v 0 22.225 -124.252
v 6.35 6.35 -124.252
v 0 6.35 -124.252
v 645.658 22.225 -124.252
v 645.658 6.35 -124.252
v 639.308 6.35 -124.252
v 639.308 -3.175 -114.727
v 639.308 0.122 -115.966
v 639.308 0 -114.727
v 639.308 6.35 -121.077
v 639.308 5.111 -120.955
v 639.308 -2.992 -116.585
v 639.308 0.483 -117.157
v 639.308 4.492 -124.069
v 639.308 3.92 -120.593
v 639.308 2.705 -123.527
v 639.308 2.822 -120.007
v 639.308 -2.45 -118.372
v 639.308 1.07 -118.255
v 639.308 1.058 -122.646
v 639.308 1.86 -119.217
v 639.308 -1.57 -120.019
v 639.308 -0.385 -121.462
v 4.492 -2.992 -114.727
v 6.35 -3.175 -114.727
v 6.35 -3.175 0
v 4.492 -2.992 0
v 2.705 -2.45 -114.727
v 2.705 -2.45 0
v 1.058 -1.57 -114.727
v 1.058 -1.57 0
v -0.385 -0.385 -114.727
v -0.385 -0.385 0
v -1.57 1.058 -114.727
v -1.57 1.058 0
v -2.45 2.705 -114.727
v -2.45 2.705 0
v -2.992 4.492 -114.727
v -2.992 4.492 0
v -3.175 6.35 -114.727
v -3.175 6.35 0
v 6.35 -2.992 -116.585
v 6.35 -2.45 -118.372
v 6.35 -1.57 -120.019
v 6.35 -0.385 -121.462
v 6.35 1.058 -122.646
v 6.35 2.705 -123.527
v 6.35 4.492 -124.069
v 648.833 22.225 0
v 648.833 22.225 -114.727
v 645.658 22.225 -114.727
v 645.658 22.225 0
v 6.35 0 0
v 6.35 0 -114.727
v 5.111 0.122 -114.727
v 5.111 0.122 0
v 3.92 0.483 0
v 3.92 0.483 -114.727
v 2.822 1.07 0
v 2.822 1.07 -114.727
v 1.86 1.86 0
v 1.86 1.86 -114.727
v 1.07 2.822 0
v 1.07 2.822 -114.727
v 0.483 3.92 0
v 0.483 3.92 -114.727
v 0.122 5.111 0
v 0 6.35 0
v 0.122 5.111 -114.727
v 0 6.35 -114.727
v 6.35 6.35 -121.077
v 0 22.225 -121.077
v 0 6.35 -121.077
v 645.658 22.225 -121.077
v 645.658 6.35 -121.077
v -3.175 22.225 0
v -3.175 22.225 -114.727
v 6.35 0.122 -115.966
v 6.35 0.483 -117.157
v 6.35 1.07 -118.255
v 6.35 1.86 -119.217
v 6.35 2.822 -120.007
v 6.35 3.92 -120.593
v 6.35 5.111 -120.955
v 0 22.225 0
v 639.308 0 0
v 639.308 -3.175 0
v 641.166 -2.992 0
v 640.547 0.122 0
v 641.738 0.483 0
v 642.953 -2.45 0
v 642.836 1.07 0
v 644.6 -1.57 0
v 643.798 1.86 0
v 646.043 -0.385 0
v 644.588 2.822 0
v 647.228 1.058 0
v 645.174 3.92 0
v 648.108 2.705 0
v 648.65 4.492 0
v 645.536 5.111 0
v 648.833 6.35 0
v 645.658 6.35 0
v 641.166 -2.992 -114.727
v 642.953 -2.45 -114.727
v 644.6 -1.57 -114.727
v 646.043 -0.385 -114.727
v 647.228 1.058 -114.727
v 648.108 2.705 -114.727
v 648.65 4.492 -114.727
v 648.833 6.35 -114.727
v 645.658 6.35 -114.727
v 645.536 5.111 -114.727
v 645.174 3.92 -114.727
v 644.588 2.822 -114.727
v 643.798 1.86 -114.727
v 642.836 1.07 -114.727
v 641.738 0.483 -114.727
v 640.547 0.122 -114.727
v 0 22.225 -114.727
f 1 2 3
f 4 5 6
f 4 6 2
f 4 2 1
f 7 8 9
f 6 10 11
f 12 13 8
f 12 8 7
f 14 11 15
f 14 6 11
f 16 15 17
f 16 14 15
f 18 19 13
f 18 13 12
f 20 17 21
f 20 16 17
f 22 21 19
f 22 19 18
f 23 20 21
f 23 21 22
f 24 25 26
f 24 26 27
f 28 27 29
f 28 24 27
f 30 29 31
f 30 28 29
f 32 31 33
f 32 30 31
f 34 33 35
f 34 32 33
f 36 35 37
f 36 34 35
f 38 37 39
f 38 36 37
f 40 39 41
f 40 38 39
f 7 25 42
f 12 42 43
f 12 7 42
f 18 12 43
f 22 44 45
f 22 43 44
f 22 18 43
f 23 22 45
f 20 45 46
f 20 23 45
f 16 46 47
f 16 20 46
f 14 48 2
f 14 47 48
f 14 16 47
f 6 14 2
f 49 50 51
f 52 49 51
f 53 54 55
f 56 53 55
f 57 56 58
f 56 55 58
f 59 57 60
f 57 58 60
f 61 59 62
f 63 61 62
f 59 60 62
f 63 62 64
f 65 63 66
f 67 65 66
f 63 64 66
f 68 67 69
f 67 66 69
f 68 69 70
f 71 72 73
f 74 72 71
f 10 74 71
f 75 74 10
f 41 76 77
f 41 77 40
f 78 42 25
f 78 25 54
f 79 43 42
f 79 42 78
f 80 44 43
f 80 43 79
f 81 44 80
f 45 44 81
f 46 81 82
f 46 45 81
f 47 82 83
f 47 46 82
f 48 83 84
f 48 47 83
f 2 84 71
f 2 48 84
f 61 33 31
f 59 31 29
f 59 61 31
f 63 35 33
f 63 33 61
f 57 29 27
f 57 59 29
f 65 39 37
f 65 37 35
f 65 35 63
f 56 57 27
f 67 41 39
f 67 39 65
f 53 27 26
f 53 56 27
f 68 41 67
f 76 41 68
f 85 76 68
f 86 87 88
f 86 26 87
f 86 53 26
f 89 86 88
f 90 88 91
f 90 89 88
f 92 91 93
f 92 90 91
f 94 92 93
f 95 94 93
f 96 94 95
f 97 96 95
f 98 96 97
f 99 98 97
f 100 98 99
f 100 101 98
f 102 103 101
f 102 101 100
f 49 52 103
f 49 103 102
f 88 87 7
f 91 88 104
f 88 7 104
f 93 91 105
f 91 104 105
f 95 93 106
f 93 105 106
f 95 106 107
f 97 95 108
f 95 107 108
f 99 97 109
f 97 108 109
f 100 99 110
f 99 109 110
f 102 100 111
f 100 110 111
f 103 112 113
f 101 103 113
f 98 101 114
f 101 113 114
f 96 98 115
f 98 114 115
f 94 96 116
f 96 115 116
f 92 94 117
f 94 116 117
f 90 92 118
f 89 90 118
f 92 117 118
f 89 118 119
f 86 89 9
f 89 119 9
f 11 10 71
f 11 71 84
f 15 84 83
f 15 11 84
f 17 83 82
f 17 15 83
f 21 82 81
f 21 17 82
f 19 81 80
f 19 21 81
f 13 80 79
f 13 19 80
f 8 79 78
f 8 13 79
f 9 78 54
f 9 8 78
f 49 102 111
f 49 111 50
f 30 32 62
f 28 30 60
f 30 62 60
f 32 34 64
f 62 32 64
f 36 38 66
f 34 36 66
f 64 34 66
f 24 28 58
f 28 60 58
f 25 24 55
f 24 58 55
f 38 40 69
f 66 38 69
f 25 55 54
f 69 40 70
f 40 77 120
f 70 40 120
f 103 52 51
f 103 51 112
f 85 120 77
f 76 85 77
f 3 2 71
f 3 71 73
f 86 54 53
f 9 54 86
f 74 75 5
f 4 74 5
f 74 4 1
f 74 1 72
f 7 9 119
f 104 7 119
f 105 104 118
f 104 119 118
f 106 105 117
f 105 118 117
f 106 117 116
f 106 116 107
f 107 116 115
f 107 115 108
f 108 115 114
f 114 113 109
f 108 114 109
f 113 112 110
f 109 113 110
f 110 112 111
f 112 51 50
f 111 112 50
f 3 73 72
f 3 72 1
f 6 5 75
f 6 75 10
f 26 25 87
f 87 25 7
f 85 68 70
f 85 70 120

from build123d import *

# Parameters (mm, degrees)
SKETCH1_W                    = 645.65784
SKETCH1_H                    = 121.07672
BASE_FLANGE1_DEPTH           = 3.175
EDGE_FLANGE1_STRIP_W         = 25.4
EDGE_FLANGE1_STRIP_H         = 3.175
EDGE_FLANGE1_STRIP_CUT_DEPTH = 645.65784
EDGE_FLANGE1_DEPTH           = 645.65784
EDGE_FLANGE2_START           = -124.25172
EDGE_FLANGE2_DEPTH           = 124.25172
EDGE_FLANGE2_2_DEPTH         = 9.525
EDGE_FLANGE2_START_2         = -114.72672
EDGE_FLANGE2_3_DEPTH         = 114.72672


# Read off the part's stored shape, not the designer's step: Edge-Flange2
# Sheet-metal steps are written as plain solids
with BuildPart() as part:
    # Sketch1 → Base-Flange1 (new body)
    with BuildSketch(Plane(origin=(0, 0, 0), x_dir=(1, 0, 0), z_dir=(0, 1, 0))):
        with Locations((322.82892, 60.53836)):
            Rectangle(SKETCH1_W, SKETCH1_H)
    extrude(amount=-BASE_FLANGE1_DEPTH)

    # Edge-Flange1 strip (across the edge) → Edge-Flange1 strip cut (cut)
    with BuildSketch(Plane(origin=(645.65784, 0, -121.07672), x_dir=(0, 0, 1), z_dir=(-1, 0, 0))):
        with Locations((-6.35, -1.5875)):
            Rectangle(EDGE_FLANGE1_STRIP_W, EDGE_FLANGE1_STRIP_H)
    extrude(amount=EDGE_FLANGE1_STRIP_CUT_DEPTH, mode=Mode.SUBTRACT)

    # Edge-Flange1 section (across the edge) → Edge-Flange1 (add)
    with BuildSketch(Plane(origin=(645.65784, 0, -121.07672), x_dir=(0, 0, 1), z_dir=(-1, 0, 0))):
        with BuildLine():
            Line((-3.175, 6.35), (-3.175, 22.225))
            Line((-3.175, 22.225), (0, 22.225))
            Line((0, 22.225), (0, 6.35))
            ThreePointArc((0, 6.35), (1.859871939, 1.859871939), (6.35, 0))
            Line((6.35, 0), (6.35, -3.175))
            ThreePointArc((6.35, -3.175), (-0.385192091, -0.385192091), (-3.175, 6.35))
        make_face()
    extrude(amount=EDGE_FLANGE1_DEPTH)

    # Edge-Flange2 outline → Edge-Flange2 (cut)
    with BuildSketch(Plane.XY.offset(EDGE_FLANGE2_START)):
        with BuildLine():
            ThreePointArc((639.30784, 0), (643.797968061, 1.859871939), (645.65784, 6.35))
            Line((645.65784, 6.35), (639.30784, 6.35))
            Line((639.30784, 6.35), (639.30784, 0))
        make_face()
        with BuildLine():
            ThreePointArc((645.65784, -0.749515829), (642.706570405, -2.547991719), (639.30784, -3.175))
            Line((639.30784, -3.175), (645.65784, -3.175))
            Line((645.65784, -3.175), (645.65784, -0.749515829))
        make_face()
        with BuildLine():
            ThreePointArc((0, 6.35), (1.859871939, 1.859871939), (6.35, 0))
            Line((6.35, 0), (6.35, 6.35))
            Line((6.35, 6.35), (0, 6.35))
        make_face()
        with BuildLine():
            Line((0, -3.175), (6.35, -3.175))
            ThreePointArc((6.35, -3.175), (2.951269595, -2.547991719), (0, -0.749515829))
            Line((0, -0.749515829), (0, -3.175))
        make_face()
    extrude(amount=EDGE_FLANGE2_DEPTH, mode=Mode.SUBTRACT)

    # Edge-Flange2 2 outline → Edge-Flange2 2 (cut)
    with BuildSketch(Plane.XY.offset(EDGE_FLANGE2_START)):
        with BuildLine():
            ThreePointArc((645.65784, 6.35), (643.797968061, 1.859871939), (639.30784, 0))
            Line((639.30784, 0), (639.30784, -3.175))
            ThreePointArc((639.30784, -3.175), (642.706570405, -2.547991719), (645.65784, -0.749515829))
            Line((645.65784, -0.749515829), (645.65784, 6.35))
        make_face()
        with BuildLine():
            Line((0, 6.35), (0, -0.749515829))
            ThreePointArc((0, -0.749515829), (2.951269595, -2.547991719), (6.35, -3.175))
            Line((6.35, -3.175), (6.35, 0))
            ThreePointArc((6.35, 0), (1.859871939, 1.859871939), (0, 6.35))
        make_face()
    extrude(amount=EDGE_FLANGE2_2_DEPTH, mode=Mode.SUBTRACT)

    # Edge-Flange2 3 outline → Edge-Flange2 3 (add)
    with BuildSketch(Plane.XY.offset(EDGE_FLANGE2_START_2)):
        with BuildLine():
            Line((639.30784, 0), (645.65784, 0))
            Line((645.65784, 0), (645.65784, -0.749515829))
            ThreePointArc((645.65784, -0.749515829), (648.002935601, 2.461435033), (648.83284, 6.35))
            Line((648.83284, 6.35), (648.83284, 22.225))
            Line((648.83284, 22.225), (645.65784, 22.225))
            Line((645.65784, 22.225), (645.65784, 6.35))
            ThreePointArc((645.65784, 6.35), (643.797968061, 1.859871939), (639.30784, 0))
        make_face()
        with BuildLine():
            Line((0, 0), (6.35, 0))
            ThreePointArc((6.35, 0), (1.859871939, 1.859871939), (0, 6.35))
            Line((0, 6.35), (0, 22.225))
            Line((0, 22.225), (-3.175, 22.225))
            Line((-3.175, 22.225), (-3.175, 6.35))
            ThreePointArc((-3.175, 6.35), (-2.345095601, 2.461435033), (0, -0.749515829))
            Line((0, -0.749515829), (0, 0))
        make_face()
    extrude(amount=EDGE_FLANGE2_3_DEPTH)


solid = part.part
